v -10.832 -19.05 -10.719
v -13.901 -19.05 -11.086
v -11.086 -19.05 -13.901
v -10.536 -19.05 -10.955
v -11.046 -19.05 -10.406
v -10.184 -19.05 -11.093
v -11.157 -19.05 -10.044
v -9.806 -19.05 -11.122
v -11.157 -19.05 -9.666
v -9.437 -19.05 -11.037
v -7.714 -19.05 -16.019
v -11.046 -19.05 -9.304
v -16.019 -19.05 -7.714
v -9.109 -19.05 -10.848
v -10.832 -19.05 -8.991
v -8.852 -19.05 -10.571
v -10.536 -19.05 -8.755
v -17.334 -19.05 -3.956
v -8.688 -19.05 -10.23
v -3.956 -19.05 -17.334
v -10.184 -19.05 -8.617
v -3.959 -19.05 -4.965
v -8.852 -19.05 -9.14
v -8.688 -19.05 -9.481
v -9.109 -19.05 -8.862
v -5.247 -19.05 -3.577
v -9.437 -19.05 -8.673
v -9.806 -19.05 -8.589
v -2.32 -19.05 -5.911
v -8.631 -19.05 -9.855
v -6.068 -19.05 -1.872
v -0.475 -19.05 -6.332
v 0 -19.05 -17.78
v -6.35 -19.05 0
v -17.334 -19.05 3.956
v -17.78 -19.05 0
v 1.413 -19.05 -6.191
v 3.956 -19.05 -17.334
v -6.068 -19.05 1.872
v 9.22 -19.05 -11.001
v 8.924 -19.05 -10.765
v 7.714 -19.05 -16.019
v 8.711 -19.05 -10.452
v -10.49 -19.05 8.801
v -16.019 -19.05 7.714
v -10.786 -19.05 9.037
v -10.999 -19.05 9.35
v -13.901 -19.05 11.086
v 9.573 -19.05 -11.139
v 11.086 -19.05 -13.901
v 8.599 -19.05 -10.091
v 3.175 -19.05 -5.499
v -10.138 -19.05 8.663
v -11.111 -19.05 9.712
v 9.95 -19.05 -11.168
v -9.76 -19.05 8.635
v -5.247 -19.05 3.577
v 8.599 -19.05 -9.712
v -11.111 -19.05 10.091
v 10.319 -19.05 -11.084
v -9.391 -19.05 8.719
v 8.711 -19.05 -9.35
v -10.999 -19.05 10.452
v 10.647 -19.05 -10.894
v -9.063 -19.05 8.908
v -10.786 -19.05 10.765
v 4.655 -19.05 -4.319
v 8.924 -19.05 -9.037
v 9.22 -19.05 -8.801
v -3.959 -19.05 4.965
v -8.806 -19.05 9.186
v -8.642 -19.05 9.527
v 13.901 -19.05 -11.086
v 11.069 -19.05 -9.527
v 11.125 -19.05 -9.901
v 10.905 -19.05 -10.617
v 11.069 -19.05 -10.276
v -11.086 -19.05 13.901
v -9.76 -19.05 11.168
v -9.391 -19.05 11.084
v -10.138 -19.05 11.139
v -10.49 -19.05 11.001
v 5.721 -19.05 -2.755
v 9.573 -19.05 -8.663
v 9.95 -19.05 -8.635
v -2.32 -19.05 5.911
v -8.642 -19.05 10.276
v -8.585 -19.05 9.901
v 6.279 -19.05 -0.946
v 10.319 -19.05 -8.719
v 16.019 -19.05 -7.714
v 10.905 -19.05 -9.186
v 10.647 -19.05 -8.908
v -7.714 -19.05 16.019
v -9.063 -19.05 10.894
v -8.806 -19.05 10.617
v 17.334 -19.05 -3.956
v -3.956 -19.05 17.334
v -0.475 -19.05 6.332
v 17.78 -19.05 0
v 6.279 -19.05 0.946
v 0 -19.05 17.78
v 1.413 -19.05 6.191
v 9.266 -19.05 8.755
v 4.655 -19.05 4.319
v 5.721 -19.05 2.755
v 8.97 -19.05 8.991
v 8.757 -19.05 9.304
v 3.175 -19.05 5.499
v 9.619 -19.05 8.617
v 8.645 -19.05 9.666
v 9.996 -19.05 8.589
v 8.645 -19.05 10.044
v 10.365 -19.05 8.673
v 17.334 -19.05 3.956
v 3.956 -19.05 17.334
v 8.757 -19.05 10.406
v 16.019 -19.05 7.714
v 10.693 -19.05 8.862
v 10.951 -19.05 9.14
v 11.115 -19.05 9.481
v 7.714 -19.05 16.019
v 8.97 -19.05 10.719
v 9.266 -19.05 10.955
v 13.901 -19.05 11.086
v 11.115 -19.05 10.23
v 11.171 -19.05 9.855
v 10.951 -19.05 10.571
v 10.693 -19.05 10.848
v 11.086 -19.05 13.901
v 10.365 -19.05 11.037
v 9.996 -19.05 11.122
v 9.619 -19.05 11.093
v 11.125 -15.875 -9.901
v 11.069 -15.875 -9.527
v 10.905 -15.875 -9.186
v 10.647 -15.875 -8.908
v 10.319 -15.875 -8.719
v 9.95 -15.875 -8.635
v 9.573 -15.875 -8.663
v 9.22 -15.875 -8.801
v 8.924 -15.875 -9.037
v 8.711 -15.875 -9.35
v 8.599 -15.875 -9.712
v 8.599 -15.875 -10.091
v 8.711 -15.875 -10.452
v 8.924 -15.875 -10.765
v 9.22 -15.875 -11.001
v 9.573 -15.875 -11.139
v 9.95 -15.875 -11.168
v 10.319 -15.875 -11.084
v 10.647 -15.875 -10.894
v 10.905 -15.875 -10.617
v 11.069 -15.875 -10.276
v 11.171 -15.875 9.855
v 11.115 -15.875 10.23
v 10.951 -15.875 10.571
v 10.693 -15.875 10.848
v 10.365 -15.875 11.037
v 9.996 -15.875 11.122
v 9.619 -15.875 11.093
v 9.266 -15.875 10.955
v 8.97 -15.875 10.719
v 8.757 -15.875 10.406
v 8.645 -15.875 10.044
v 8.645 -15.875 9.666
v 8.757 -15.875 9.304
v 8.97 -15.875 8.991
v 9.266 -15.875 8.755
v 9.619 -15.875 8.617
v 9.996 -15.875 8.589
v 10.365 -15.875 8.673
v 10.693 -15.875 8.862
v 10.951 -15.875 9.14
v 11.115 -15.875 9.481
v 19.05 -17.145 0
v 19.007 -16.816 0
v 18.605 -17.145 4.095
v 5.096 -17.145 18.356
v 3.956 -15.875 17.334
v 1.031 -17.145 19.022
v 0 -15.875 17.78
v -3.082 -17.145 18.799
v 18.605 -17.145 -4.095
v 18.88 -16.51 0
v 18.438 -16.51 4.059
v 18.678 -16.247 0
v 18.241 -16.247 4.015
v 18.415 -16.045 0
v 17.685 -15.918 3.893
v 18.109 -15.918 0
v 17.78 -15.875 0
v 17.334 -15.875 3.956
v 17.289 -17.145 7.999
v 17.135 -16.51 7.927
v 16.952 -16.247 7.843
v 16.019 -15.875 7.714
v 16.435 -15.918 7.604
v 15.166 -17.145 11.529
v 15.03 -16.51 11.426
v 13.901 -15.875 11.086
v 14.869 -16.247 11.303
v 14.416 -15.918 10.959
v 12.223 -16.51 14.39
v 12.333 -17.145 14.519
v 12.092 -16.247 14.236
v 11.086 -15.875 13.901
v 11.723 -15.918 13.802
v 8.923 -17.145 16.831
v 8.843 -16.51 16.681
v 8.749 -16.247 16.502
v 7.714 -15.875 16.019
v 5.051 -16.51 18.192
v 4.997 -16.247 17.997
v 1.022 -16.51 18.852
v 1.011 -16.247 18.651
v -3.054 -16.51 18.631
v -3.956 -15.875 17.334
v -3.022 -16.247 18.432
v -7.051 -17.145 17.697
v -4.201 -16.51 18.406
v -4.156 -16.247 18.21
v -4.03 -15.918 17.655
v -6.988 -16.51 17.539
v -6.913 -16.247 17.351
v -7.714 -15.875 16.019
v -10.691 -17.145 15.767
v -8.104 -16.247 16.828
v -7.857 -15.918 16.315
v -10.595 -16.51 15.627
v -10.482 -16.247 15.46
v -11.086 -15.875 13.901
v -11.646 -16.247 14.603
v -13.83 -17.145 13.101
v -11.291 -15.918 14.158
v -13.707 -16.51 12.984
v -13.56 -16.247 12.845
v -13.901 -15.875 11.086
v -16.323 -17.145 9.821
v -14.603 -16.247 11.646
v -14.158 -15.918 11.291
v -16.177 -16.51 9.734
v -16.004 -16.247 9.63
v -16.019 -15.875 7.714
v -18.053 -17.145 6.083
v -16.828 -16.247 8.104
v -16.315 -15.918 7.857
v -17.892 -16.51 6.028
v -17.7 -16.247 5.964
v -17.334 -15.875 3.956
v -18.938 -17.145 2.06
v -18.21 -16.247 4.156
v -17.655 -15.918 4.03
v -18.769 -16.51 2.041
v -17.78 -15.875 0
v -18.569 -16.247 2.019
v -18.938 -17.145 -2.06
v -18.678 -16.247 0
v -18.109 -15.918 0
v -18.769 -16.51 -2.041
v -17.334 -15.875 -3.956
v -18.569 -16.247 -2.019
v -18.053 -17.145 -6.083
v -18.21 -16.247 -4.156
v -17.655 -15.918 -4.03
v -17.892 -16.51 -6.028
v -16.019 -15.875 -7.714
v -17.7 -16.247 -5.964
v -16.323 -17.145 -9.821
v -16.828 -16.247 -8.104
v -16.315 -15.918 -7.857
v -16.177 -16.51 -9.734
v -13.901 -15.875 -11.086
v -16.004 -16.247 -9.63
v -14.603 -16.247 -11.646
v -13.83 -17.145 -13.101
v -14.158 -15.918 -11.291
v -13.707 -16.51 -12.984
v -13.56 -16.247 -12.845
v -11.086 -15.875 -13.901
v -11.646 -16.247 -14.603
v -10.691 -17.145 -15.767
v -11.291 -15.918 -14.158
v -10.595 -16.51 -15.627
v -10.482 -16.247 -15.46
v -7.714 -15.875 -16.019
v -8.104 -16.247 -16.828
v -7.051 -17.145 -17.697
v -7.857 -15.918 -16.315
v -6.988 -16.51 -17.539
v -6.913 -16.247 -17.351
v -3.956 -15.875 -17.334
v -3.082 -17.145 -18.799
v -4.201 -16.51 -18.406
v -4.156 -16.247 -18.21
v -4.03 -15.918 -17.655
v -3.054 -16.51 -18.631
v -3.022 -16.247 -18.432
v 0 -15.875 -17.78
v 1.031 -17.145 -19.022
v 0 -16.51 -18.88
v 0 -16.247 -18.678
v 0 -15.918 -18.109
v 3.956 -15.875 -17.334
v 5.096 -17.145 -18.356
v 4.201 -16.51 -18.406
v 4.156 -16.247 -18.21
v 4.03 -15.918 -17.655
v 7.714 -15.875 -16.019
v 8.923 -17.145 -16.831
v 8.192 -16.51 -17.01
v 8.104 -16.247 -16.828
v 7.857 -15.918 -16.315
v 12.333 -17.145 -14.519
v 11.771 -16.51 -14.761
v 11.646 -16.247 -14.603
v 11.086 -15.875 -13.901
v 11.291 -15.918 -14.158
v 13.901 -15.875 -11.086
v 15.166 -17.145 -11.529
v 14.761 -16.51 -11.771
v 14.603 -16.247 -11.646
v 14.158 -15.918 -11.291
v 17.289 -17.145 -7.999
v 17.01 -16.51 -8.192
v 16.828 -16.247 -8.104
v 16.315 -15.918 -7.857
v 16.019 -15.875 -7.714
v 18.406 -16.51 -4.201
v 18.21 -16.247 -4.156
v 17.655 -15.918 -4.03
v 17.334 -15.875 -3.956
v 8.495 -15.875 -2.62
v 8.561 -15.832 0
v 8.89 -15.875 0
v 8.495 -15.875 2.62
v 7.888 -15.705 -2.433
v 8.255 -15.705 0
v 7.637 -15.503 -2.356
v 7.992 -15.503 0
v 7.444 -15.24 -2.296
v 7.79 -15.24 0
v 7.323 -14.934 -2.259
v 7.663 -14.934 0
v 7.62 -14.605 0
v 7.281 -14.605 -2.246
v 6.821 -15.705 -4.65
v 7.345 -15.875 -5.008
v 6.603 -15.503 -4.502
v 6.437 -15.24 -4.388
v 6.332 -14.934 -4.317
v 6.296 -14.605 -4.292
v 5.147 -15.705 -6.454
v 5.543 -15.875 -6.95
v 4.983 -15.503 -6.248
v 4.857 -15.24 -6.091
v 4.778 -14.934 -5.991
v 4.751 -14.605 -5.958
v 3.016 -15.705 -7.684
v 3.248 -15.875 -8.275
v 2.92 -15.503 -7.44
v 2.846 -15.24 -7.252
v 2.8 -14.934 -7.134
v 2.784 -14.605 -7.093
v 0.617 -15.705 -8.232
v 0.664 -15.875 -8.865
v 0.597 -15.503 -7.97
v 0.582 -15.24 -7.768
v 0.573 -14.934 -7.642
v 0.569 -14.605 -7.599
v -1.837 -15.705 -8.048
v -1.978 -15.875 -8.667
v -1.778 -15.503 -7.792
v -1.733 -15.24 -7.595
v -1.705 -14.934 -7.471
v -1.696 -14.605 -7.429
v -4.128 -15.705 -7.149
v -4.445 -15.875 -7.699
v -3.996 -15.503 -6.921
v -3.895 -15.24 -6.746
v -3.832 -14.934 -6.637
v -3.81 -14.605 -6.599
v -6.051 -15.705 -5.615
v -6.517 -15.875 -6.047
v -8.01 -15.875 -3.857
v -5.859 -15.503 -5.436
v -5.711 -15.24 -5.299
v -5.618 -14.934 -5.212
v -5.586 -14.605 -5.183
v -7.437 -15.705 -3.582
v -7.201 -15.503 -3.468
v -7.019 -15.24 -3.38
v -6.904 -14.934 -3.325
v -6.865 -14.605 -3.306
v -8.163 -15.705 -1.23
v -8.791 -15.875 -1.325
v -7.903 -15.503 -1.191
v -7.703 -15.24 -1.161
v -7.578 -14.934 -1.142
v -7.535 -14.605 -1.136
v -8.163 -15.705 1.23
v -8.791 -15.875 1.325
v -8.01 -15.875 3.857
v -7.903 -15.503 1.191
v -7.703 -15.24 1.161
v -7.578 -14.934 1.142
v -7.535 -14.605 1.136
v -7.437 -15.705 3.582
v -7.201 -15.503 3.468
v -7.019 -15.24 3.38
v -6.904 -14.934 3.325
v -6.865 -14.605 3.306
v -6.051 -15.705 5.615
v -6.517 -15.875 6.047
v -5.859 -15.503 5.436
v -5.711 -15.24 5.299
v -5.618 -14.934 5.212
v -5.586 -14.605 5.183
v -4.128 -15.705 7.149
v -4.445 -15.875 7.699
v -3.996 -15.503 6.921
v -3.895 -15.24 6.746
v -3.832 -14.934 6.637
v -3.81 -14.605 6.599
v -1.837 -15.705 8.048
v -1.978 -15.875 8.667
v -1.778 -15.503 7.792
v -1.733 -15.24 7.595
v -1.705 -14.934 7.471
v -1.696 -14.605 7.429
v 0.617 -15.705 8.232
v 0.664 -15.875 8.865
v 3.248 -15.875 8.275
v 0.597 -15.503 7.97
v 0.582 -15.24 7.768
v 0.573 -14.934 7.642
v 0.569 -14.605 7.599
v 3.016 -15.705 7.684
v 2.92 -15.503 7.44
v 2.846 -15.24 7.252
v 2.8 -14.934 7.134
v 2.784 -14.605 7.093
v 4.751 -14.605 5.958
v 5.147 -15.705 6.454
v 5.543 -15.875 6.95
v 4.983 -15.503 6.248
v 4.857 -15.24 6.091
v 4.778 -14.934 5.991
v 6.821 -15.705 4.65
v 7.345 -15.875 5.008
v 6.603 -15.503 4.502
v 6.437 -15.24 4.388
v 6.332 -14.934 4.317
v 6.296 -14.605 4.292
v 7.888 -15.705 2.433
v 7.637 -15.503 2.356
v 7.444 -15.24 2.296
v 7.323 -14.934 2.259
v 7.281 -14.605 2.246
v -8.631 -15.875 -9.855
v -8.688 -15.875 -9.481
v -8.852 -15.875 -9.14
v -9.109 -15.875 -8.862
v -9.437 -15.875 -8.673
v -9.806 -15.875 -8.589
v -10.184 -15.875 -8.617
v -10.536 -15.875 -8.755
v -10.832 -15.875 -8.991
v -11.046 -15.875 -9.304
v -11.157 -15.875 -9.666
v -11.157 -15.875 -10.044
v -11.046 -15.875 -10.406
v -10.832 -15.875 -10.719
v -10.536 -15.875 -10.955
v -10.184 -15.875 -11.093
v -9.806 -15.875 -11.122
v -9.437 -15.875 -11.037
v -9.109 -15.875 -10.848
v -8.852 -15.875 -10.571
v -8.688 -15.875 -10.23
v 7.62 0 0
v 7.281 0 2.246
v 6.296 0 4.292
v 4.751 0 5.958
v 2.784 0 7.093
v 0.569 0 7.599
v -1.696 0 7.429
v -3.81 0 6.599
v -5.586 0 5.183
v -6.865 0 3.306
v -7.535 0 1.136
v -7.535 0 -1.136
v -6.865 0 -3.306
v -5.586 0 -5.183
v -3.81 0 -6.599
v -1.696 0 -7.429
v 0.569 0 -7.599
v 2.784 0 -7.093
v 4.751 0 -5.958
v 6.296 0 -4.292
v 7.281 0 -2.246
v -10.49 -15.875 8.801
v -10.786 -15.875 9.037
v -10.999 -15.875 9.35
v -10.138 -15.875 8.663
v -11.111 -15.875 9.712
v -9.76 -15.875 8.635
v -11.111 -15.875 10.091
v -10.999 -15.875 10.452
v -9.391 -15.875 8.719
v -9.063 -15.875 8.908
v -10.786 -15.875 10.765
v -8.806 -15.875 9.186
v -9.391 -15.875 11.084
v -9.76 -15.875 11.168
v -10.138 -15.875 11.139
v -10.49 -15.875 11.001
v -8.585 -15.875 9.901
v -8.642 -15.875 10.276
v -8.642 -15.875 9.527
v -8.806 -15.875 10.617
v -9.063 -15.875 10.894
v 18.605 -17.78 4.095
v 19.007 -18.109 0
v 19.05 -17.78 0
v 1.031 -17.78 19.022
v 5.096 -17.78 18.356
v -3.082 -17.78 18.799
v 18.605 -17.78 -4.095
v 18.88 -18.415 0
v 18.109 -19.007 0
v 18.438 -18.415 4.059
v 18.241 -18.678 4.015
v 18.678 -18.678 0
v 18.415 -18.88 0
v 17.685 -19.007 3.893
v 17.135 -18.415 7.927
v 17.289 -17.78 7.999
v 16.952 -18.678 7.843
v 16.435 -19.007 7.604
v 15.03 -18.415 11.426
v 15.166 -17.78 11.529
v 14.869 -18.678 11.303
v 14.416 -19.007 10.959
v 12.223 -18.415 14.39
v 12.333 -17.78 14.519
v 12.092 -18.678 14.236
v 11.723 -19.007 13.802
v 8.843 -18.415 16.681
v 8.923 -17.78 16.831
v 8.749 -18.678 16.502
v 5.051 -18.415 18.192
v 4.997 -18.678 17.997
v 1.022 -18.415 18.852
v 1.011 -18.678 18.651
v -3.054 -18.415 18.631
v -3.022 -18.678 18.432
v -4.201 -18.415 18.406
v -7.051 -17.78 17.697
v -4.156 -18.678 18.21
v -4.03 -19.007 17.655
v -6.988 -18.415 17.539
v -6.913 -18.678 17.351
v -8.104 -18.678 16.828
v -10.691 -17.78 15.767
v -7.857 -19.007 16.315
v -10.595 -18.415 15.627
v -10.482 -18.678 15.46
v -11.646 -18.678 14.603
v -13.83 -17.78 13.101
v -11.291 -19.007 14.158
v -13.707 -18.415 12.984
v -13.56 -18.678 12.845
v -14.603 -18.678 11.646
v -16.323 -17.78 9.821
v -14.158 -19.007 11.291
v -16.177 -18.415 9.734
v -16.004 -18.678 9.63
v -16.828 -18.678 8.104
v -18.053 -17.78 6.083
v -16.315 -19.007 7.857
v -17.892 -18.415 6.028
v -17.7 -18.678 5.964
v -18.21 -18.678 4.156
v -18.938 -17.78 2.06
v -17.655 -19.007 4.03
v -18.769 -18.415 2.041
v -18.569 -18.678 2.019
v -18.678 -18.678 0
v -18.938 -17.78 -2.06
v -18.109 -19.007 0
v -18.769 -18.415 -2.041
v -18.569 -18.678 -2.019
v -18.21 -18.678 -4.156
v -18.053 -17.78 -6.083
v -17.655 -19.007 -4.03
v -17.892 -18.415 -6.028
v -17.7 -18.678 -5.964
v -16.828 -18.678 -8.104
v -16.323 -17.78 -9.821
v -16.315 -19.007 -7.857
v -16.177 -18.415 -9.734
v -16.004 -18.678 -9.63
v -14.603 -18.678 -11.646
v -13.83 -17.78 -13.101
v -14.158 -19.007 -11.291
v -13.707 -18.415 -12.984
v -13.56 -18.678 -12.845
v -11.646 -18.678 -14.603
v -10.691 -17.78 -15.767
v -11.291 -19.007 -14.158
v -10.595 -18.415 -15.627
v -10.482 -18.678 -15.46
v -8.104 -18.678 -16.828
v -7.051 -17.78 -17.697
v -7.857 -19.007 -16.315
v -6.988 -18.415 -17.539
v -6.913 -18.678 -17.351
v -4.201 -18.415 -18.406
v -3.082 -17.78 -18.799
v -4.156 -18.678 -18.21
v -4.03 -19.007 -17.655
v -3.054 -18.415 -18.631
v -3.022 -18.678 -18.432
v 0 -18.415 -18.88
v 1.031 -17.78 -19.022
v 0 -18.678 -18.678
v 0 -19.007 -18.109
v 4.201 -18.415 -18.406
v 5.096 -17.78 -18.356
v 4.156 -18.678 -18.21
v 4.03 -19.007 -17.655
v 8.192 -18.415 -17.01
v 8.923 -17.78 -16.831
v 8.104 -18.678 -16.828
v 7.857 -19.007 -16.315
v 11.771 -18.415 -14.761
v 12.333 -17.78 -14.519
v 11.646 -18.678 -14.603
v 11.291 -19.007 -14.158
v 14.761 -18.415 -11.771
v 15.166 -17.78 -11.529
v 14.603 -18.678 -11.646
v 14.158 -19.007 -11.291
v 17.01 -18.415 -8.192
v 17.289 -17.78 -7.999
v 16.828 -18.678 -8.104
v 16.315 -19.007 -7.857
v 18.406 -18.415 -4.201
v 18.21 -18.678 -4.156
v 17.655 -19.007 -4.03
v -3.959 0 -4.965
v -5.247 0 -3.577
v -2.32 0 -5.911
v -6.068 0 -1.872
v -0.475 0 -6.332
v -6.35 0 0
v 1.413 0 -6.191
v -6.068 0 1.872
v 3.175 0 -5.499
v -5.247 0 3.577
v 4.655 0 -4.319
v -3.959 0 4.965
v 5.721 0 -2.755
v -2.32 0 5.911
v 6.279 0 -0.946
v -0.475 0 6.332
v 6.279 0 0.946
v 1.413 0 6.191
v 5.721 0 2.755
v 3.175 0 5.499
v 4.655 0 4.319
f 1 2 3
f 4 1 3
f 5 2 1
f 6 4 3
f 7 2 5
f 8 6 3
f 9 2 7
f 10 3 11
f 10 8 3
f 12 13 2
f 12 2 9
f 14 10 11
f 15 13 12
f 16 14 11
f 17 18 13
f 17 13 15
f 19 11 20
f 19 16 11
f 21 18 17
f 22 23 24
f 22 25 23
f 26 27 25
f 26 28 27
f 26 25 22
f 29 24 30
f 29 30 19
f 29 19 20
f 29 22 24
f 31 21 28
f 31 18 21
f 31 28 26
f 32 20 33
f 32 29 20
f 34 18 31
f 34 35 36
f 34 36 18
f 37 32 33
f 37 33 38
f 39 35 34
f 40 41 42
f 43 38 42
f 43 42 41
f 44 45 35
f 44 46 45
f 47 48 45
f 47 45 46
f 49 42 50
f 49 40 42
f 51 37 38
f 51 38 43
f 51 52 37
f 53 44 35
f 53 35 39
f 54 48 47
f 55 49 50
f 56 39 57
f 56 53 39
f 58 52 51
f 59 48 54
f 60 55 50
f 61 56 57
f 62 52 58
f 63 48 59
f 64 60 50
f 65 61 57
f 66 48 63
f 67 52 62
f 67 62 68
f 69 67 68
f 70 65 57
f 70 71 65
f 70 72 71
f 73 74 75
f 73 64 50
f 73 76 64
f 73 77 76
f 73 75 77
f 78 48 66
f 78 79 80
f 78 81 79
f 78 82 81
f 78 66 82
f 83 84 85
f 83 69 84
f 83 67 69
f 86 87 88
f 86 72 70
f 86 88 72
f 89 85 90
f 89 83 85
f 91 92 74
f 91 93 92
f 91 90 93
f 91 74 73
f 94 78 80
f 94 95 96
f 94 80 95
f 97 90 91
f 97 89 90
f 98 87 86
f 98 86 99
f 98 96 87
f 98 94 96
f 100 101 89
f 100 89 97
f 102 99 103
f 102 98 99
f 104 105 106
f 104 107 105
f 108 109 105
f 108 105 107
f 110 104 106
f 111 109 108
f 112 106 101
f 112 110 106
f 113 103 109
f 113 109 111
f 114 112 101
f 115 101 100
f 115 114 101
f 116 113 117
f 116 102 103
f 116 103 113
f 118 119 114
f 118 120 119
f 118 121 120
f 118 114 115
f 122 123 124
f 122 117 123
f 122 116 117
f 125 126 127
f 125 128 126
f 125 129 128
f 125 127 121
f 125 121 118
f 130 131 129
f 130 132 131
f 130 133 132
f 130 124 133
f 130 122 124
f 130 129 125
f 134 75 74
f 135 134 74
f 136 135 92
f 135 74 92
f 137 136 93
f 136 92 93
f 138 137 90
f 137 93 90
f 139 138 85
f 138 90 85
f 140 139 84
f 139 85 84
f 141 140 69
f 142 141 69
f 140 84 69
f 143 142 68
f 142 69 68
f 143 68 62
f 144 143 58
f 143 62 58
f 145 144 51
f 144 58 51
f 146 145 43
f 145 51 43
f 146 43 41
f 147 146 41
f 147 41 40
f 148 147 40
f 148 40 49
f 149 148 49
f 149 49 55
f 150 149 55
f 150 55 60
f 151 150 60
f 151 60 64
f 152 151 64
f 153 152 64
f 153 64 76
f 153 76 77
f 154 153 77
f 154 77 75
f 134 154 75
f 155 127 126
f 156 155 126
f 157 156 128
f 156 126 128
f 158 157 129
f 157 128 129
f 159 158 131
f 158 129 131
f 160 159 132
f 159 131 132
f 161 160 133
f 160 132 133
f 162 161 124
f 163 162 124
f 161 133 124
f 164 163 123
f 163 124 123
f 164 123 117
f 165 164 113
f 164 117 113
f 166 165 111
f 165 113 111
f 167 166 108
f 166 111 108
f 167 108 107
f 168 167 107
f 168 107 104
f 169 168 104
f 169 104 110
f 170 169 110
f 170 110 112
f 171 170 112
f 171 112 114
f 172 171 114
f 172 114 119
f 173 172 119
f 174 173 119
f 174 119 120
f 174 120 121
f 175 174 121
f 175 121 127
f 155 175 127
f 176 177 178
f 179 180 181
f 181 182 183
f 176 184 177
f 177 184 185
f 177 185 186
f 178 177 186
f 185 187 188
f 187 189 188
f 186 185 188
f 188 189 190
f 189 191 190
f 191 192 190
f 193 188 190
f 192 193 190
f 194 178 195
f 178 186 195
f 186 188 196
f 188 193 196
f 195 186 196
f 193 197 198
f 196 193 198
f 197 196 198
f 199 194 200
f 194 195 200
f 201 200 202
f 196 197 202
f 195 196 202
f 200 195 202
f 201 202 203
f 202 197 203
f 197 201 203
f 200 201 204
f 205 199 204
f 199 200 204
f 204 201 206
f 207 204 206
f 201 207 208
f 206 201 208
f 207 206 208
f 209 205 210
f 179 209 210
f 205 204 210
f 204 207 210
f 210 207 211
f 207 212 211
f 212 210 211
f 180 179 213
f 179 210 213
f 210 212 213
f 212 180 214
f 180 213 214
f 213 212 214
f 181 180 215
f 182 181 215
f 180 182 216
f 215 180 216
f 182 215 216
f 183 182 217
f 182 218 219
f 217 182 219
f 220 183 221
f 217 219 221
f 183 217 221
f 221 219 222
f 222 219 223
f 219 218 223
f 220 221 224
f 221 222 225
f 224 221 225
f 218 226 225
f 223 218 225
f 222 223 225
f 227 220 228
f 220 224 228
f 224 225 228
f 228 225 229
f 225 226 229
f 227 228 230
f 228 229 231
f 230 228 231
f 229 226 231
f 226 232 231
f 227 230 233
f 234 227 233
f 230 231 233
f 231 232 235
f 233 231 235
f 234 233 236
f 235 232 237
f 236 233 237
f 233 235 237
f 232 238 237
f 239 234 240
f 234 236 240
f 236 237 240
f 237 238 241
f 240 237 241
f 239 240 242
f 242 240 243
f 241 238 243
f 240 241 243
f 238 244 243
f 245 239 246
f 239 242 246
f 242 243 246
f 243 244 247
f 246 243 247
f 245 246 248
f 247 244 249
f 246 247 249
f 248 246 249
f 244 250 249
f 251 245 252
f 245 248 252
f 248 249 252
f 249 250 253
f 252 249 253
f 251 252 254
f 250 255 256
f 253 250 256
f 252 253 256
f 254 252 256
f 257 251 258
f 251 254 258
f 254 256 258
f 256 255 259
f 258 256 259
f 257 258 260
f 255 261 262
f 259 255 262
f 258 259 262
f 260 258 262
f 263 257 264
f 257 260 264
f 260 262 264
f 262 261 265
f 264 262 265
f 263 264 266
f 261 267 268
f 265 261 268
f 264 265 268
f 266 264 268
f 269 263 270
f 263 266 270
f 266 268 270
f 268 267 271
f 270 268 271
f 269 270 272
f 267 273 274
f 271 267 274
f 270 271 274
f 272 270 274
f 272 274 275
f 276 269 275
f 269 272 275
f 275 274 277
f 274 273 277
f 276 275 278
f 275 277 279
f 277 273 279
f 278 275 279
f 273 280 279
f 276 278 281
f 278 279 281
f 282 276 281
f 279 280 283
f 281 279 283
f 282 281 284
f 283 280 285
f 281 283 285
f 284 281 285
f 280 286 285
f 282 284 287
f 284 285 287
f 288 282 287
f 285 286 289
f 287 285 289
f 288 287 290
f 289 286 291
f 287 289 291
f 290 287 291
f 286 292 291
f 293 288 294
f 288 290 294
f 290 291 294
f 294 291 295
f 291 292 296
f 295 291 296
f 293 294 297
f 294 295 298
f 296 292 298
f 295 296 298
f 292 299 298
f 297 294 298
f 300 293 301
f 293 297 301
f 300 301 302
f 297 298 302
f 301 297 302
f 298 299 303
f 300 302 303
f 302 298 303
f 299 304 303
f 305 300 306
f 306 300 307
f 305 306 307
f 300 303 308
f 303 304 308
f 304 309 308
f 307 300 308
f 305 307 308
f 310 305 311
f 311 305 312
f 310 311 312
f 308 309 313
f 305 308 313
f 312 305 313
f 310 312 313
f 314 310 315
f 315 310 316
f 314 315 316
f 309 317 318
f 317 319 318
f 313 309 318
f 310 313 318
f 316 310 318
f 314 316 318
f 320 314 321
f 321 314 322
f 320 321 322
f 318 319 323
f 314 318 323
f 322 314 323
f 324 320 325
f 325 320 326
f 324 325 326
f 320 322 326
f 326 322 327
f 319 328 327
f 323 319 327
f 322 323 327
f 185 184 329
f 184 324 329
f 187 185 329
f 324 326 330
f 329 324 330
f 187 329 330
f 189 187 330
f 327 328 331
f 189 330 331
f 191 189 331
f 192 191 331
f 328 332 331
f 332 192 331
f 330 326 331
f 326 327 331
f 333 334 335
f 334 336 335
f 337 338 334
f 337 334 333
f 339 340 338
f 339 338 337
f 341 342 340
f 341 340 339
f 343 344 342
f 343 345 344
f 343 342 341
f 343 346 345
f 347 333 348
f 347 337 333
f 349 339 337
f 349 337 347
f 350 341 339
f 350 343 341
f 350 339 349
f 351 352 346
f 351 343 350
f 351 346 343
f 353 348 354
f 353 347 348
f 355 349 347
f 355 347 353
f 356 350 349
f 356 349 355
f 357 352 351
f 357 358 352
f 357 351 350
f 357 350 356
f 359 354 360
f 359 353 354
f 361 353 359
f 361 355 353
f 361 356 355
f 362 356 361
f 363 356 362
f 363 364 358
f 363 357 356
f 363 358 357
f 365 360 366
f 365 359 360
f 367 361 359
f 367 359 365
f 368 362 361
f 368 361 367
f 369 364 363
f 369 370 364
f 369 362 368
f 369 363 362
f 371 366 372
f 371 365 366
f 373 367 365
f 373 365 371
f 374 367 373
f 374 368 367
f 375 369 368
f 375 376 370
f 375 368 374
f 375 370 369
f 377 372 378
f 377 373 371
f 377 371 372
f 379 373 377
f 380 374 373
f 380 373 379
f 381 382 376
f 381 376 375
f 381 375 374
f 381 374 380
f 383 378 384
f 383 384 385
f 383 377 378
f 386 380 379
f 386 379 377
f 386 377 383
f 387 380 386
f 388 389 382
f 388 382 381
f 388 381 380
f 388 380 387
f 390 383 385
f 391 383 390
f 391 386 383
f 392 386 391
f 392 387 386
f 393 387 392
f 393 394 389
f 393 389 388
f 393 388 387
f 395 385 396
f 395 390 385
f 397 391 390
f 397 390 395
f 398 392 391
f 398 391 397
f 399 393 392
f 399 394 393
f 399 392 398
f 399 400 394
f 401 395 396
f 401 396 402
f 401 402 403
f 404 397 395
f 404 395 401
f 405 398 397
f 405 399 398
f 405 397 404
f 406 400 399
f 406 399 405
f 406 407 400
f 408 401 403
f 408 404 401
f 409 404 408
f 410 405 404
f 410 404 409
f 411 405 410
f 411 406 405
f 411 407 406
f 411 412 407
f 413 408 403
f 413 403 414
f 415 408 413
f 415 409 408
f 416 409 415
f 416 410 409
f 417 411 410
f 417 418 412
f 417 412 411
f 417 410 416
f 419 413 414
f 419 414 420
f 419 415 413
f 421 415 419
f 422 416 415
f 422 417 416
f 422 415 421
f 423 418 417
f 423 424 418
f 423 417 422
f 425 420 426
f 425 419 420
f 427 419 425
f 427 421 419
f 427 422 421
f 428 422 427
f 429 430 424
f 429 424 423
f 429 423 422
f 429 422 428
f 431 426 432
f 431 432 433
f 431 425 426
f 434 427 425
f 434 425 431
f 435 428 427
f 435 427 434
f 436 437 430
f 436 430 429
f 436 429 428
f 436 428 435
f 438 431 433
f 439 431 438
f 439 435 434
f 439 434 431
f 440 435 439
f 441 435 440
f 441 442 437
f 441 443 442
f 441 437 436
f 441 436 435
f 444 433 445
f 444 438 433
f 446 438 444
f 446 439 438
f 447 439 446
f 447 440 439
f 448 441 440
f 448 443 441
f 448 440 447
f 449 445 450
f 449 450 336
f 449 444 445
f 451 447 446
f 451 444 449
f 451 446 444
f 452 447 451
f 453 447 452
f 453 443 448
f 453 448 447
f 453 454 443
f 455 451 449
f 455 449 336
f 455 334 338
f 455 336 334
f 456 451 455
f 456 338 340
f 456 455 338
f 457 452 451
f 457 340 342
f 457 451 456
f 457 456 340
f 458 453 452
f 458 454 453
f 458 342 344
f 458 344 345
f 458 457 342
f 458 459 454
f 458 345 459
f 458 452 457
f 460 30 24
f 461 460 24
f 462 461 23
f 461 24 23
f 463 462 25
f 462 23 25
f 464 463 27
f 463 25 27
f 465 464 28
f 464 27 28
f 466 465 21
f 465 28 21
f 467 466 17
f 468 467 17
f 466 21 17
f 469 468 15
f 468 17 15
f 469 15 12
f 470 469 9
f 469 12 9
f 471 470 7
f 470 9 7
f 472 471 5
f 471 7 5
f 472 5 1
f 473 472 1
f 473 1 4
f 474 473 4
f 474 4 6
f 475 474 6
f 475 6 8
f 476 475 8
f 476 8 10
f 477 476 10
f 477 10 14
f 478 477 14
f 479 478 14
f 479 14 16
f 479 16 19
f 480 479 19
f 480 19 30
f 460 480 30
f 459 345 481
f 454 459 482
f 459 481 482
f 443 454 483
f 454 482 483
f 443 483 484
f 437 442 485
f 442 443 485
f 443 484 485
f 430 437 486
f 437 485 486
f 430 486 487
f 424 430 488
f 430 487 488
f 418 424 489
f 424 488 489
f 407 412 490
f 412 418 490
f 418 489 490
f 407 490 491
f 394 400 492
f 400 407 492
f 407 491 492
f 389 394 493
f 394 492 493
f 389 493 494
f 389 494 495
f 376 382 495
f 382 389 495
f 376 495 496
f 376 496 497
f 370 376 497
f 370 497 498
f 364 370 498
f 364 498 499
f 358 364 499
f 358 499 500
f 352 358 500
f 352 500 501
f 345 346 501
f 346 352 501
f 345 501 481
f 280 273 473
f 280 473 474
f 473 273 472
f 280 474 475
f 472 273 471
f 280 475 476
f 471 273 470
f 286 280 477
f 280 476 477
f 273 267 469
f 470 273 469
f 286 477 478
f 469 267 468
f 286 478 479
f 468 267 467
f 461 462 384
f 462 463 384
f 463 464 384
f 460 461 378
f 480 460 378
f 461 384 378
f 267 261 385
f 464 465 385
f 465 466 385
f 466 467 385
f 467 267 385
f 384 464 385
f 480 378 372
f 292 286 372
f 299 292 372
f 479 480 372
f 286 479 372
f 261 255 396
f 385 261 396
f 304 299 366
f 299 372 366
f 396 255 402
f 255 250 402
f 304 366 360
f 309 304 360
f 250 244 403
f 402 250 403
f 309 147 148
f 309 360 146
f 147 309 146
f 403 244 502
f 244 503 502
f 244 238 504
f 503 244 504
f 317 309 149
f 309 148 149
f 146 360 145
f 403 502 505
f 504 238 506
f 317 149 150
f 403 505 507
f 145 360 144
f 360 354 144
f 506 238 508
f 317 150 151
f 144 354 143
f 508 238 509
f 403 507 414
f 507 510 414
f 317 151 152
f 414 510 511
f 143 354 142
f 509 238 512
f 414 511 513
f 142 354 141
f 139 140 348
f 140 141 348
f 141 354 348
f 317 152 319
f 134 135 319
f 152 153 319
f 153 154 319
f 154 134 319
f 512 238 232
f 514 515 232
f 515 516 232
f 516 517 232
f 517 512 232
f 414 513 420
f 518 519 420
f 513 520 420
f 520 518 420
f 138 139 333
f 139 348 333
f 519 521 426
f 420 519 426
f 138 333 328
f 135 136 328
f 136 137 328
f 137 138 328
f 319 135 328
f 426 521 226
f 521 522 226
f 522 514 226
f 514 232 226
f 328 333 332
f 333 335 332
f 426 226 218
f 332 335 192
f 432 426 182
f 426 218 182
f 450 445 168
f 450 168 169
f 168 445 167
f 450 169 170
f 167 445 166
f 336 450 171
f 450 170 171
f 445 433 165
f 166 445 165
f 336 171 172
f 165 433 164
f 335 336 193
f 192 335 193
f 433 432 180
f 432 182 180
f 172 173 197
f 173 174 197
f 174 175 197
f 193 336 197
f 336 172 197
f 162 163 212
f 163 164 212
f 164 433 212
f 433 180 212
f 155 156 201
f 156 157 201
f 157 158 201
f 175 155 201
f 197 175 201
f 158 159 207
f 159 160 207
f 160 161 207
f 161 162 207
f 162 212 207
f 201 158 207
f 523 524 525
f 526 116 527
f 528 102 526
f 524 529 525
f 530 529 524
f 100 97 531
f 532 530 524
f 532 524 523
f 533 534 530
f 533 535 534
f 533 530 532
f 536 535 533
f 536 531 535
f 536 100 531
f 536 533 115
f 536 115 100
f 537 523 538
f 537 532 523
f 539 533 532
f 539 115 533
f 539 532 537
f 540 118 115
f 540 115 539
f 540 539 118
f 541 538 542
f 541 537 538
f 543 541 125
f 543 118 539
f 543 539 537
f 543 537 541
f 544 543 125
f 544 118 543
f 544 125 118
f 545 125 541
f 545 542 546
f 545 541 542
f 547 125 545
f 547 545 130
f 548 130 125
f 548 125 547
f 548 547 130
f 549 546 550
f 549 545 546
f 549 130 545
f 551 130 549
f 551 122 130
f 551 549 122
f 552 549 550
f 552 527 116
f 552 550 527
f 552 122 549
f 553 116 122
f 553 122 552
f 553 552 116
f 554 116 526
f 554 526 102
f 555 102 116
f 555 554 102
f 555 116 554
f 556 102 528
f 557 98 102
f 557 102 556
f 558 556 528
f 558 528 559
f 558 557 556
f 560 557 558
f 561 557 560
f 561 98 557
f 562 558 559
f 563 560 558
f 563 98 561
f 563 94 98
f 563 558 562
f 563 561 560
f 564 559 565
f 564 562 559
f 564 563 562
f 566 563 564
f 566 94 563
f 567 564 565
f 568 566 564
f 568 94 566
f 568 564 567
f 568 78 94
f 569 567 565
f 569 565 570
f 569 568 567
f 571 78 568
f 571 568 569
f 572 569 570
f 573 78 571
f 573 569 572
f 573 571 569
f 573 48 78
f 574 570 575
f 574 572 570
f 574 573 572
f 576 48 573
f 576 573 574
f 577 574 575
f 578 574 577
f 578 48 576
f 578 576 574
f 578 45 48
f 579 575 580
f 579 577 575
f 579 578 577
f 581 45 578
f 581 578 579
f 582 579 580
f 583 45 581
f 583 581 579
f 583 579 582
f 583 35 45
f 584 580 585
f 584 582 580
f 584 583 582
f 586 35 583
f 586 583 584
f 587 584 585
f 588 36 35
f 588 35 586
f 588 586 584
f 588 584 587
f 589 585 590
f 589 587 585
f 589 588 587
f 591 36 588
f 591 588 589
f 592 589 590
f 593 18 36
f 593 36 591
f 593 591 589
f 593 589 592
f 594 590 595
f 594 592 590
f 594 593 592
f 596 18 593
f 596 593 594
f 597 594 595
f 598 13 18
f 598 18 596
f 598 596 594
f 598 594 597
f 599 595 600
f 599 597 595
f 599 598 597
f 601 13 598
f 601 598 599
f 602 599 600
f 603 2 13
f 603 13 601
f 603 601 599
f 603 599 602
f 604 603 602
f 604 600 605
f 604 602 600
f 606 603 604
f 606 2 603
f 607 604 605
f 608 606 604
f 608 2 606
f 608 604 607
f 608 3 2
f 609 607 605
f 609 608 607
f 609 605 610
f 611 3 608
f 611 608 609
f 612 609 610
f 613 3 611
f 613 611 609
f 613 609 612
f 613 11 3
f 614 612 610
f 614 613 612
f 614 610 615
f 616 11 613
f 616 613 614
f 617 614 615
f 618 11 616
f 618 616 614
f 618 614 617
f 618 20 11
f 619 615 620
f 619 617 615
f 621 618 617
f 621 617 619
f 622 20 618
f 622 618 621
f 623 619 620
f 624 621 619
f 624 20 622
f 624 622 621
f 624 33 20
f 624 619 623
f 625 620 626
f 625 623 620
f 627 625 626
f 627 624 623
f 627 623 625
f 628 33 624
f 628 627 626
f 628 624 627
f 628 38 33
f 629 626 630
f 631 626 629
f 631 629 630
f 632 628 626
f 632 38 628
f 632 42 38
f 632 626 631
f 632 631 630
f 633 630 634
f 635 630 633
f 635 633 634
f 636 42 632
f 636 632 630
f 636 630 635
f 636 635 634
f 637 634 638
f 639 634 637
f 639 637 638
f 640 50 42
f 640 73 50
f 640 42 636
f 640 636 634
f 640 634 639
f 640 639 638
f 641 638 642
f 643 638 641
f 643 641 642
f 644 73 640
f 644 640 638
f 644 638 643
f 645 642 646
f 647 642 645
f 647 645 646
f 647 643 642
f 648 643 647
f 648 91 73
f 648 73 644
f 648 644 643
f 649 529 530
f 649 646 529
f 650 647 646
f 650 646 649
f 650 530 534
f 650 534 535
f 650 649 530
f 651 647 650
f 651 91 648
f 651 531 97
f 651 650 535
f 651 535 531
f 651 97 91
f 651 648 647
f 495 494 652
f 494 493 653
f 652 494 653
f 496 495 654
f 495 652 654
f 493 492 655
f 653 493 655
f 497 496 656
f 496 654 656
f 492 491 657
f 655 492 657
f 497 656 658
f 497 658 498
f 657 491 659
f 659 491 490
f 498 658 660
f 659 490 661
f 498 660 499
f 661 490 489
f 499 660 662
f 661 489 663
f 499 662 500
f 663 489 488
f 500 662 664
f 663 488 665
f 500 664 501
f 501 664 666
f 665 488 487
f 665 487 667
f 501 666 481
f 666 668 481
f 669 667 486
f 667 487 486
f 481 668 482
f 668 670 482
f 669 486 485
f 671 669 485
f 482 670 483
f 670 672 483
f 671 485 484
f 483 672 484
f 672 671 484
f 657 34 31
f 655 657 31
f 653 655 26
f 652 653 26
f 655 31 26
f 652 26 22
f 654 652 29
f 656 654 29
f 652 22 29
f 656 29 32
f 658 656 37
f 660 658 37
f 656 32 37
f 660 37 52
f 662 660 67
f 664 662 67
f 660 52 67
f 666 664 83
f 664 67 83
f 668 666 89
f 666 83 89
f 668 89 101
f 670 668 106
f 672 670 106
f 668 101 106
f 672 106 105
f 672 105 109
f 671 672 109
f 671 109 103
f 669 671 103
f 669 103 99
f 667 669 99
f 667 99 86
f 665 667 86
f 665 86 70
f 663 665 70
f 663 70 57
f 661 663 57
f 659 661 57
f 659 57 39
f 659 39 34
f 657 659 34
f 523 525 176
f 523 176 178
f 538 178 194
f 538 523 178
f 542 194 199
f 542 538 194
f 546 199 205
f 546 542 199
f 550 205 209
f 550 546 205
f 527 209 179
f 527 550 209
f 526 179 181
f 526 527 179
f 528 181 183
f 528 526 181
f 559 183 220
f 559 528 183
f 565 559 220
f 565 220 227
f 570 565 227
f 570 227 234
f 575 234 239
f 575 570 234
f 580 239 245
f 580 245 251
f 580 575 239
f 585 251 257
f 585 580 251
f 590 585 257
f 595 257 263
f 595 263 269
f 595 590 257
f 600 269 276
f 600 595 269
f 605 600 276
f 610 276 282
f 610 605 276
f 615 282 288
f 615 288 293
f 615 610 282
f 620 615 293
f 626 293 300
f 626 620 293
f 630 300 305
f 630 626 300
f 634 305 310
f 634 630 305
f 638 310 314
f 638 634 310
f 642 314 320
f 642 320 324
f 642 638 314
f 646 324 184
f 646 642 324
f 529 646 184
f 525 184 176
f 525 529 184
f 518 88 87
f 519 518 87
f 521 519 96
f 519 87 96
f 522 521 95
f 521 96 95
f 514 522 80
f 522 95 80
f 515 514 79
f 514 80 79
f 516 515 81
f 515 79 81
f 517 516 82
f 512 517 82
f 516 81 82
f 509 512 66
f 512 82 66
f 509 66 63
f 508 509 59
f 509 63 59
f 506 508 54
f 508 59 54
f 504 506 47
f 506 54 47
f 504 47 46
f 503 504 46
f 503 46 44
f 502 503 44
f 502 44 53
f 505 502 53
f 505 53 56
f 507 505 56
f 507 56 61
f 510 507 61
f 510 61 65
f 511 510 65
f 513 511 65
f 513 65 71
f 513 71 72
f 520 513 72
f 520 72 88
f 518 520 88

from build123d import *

# Parameters (mm, degrees)
F0_R     = 7.62
F1_DEPTH = 19.05
F2_R     = 19.05
F2_R_2   = 7.62
F3_DEPTH = 3.175
F4_D     = 12.7
F5_R     = 1.27
F7_D     = 2.54


with BuildPart() as f1:
    # F0 (on Front) → F1 (new body)
    with BuildSketch(Plane.XZ):
        Circle(F0_R)
    extrude(amount=F1_DEPTH)

    # F2 (on face) → F3 (join)
    with BuildSketch(Plane.XZ.offset(19.05)):
        Circle(F2_R)
        Circle(F2_R_2, mode=Mode.SUBTRACT)
        Circle(F2_R_2)
    extrude(amount=-F3_DEPTH)

    # F4 (through all)
    with Locations(Plane(origin=(0, 0, 0), x_dir=(1, 0, 0), z_dir=(0, 1, 0))):
        with Locations((0, 0)):
            Hole(F4_D / 2)

    # F5
    f5_edges = [f1.edges().sort_by_distance(p)[0] for p in [
        (-19.05, -15.875, 0),
        (-7.62, -15.875, 0),
        (-19.05, -19.05, 0),
    ]]
    fillet(f5_edges, radius=F5_R)

    # F7 (through all)
    with Locations(Plane(origin=(0, -15.875, 0), x_dir=(-1, 0, 0), z_dir=(0, 1, 0))):
        with Locations((-9.90131, 9.8552), (9.8552, 9.90131), (9.90131, -9.8552), (-9.8552, -9.90131)):
            Hole(F7_D / 2)


solid = f1.part
